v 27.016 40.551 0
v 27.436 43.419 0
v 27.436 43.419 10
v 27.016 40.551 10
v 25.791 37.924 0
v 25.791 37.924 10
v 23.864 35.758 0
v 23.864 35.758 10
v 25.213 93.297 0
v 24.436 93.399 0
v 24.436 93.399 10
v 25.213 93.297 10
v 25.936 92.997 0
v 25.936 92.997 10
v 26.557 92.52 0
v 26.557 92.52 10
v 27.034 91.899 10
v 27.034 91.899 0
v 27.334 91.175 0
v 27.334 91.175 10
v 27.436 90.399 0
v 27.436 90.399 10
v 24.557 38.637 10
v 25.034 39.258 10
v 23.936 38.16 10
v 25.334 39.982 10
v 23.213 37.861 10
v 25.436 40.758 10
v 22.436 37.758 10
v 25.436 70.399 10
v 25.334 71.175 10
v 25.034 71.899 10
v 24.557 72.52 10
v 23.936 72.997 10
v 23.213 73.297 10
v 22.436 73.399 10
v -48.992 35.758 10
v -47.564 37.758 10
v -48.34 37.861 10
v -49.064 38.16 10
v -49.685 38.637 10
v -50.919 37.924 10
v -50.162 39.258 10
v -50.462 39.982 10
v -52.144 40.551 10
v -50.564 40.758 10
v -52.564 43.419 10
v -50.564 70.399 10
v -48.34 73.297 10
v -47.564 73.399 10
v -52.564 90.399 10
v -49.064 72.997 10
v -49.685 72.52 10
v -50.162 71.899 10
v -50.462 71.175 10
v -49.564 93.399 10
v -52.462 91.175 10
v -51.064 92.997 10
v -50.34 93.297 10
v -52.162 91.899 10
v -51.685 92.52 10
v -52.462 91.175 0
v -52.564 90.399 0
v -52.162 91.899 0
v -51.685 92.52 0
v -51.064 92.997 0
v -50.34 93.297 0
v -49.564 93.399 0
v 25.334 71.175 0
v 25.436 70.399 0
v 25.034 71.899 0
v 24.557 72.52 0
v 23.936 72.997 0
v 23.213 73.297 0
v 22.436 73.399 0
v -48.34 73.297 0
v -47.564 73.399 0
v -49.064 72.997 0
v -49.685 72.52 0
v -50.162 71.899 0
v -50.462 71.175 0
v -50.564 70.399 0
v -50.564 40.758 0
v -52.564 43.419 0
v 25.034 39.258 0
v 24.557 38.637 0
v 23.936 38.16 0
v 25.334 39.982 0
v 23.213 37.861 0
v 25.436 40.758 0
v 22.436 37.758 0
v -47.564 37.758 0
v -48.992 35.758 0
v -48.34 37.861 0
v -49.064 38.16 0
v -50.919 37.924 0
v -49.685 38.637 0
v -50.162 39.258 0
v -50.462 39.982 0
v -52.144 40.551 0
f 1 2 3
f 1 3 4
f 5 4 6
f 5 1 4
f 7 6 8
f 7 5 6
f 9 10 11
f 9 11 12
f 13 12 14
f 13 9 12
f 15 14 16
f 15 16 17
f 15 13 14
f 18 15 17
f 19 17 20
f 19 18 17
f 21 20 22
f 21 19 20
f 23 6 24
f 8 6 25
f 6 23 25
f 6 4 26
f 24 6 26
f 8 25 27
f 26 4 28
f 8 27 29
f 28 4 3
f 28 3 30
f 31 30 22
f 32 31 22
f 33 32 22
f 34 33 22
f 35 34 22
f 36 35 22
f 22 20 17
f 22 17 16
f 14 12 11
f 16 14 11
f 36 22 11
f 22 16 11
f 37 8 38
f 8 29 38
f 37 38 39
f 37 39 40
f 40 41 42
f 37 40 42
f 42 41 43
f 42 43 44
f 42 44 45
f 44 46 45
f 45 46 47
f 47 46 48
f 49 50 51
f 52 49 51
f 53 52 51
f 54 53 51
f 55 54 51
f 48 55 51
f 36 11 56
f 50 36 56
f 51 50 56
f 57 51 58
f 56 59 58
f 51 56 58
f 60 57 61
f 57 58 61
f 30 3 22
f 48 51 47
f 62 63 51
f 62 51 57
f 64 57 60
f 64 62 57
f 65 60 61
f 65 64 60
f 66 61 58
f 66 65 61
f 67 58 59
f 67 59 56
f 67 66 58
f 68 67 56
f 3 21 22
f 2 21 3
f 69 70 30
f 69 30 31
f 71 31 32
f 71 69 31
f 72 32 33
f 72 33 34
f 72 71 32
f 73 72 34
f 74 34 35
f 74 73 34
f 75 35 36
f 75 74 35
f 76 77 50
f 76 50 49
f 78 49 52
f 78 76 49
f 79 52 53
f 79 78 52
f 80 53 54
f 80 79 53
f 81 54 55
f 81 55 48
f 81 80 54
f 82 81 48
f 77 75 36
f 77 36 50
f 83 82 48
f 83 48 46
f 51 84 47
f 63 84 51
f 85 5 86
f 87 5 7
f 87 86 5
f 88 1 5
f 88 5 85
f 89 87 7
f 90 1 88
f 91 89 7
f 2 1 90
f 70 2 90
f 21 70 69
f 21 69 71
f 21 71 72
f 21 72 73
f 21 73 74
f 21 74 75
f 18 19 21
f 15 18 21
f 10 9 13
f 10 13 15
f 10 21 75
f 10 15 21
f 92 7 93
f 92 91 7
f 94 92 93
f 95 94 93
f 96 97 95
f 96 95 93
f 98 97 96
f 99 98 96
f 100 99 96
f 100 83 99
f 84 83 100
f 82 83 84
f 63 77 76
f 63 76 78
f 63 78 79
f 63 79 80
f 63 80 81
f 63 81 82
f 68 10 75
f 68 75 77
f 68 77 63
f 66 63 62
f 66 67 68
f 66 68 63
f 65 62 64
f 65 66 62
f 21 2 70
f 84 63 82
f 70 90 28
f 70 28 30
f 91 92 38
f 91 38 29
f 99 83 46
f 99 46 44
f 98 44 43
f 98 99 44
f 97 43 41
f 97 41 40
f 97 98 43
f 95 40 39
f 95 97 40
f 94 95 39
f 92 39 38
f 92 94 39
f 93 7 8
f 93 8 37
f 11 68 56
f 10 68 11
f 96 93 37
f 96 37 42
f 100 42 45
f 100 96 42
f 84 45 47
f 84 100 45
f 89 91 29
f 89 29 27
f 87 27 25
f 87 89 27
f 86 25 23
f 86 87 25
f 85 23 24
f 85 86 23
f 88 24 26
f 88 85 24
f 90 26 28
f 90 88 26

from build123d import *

# Parameters (mm, degrees)
RESSALTO_EXTRUS_O1_DEPTH = 10
CORTE_EXTRUS_O1_DEPTH    = 10


with BuildPart() as part:
    # Esboço1 → Ressalto-extrusão1 (new body)
    with BuildSketch(Plane.XY):
        with BuildLine():
            Line((-49.563885949, 93.398903013), (24.436114051, 93.398903013))
            ThreePointArc((24.436114051, 93.398903013), (26.557434395, 92.520223357), (27.436114051, 90.398903013))
            Line((27.436114051, 90.398903013), (27.436114051, 78.398903013))
            Line((27.436114051, 78.398903013), (27.436114051, 43.418903013))
            ThreePointArc((27.436114051, 43.418903013), (26.499191921, 39.192720396), (23.863990148, 35.758458582))
            Line((23.863990148, 35.758458582), (-48.991762046, 35.758458582))
            ThreePointArc((-48.991762046, 35.758458582), (-51.626963819, 39.192720396), (-52.563885949, 43.418903013))
            Line((-52.563885949, 43.418903013), (-52.563885949, 78.398903013))
            Line((-52.563885949, 78.398903013), (-52.563885949, 90.398903013))
            ThreePointArc((-52.563885949, 90.398903013), (-51.685206293, 92.520223357), (-49.563885949, 93.398903013))
        make_face()
    extrude(amount=RESSALTO_EXTRUS_O1_DEPTH)

    # Esboço2 → Corte-extrusão1 (cut)
    with BuildSketch(Plane(origin=(0, 0, 0), x_dir=(-1, 0, 0), z_dir=(0, 0, -1))):
        with BuildLine():
            Line((-22.436114051, 73.398903013), (47.563885949, 73.398903013))
            ThreePointArc((47.563885949, 73.398903013), (49.685206293, 72.520223357), (50.563885949, 70.398903013))
            Line((50.563885949, 70.398903013), (50.563885949, 40.758458582))
            ThreePointArc((50.563885949, 40.758458582), (49.685206293, 38.637138238), (47.563885949, 37.758458582))
            Line((47.563885949, 37.758458582), (-22.436114051, 37.758458582))
            ThreePointArc((-22.436114051, 37.758458582), (-24.557434395, 38.637138238), (-25.436114051, 40.758458582))
            Line((-25.436114051, 40.758458582), (-25.436114051, 70.398903013))
            ThreePointArc((-25.436114051, 70.398903013), (-24.557434395, 72.520223357), (-22.436114051, 73.398903013))
        make_face()
    extrude(amount=-CORTE_EXTRUS_O1_DEPTH, mode=Mode.SUBTRACT)


solid = part.part
